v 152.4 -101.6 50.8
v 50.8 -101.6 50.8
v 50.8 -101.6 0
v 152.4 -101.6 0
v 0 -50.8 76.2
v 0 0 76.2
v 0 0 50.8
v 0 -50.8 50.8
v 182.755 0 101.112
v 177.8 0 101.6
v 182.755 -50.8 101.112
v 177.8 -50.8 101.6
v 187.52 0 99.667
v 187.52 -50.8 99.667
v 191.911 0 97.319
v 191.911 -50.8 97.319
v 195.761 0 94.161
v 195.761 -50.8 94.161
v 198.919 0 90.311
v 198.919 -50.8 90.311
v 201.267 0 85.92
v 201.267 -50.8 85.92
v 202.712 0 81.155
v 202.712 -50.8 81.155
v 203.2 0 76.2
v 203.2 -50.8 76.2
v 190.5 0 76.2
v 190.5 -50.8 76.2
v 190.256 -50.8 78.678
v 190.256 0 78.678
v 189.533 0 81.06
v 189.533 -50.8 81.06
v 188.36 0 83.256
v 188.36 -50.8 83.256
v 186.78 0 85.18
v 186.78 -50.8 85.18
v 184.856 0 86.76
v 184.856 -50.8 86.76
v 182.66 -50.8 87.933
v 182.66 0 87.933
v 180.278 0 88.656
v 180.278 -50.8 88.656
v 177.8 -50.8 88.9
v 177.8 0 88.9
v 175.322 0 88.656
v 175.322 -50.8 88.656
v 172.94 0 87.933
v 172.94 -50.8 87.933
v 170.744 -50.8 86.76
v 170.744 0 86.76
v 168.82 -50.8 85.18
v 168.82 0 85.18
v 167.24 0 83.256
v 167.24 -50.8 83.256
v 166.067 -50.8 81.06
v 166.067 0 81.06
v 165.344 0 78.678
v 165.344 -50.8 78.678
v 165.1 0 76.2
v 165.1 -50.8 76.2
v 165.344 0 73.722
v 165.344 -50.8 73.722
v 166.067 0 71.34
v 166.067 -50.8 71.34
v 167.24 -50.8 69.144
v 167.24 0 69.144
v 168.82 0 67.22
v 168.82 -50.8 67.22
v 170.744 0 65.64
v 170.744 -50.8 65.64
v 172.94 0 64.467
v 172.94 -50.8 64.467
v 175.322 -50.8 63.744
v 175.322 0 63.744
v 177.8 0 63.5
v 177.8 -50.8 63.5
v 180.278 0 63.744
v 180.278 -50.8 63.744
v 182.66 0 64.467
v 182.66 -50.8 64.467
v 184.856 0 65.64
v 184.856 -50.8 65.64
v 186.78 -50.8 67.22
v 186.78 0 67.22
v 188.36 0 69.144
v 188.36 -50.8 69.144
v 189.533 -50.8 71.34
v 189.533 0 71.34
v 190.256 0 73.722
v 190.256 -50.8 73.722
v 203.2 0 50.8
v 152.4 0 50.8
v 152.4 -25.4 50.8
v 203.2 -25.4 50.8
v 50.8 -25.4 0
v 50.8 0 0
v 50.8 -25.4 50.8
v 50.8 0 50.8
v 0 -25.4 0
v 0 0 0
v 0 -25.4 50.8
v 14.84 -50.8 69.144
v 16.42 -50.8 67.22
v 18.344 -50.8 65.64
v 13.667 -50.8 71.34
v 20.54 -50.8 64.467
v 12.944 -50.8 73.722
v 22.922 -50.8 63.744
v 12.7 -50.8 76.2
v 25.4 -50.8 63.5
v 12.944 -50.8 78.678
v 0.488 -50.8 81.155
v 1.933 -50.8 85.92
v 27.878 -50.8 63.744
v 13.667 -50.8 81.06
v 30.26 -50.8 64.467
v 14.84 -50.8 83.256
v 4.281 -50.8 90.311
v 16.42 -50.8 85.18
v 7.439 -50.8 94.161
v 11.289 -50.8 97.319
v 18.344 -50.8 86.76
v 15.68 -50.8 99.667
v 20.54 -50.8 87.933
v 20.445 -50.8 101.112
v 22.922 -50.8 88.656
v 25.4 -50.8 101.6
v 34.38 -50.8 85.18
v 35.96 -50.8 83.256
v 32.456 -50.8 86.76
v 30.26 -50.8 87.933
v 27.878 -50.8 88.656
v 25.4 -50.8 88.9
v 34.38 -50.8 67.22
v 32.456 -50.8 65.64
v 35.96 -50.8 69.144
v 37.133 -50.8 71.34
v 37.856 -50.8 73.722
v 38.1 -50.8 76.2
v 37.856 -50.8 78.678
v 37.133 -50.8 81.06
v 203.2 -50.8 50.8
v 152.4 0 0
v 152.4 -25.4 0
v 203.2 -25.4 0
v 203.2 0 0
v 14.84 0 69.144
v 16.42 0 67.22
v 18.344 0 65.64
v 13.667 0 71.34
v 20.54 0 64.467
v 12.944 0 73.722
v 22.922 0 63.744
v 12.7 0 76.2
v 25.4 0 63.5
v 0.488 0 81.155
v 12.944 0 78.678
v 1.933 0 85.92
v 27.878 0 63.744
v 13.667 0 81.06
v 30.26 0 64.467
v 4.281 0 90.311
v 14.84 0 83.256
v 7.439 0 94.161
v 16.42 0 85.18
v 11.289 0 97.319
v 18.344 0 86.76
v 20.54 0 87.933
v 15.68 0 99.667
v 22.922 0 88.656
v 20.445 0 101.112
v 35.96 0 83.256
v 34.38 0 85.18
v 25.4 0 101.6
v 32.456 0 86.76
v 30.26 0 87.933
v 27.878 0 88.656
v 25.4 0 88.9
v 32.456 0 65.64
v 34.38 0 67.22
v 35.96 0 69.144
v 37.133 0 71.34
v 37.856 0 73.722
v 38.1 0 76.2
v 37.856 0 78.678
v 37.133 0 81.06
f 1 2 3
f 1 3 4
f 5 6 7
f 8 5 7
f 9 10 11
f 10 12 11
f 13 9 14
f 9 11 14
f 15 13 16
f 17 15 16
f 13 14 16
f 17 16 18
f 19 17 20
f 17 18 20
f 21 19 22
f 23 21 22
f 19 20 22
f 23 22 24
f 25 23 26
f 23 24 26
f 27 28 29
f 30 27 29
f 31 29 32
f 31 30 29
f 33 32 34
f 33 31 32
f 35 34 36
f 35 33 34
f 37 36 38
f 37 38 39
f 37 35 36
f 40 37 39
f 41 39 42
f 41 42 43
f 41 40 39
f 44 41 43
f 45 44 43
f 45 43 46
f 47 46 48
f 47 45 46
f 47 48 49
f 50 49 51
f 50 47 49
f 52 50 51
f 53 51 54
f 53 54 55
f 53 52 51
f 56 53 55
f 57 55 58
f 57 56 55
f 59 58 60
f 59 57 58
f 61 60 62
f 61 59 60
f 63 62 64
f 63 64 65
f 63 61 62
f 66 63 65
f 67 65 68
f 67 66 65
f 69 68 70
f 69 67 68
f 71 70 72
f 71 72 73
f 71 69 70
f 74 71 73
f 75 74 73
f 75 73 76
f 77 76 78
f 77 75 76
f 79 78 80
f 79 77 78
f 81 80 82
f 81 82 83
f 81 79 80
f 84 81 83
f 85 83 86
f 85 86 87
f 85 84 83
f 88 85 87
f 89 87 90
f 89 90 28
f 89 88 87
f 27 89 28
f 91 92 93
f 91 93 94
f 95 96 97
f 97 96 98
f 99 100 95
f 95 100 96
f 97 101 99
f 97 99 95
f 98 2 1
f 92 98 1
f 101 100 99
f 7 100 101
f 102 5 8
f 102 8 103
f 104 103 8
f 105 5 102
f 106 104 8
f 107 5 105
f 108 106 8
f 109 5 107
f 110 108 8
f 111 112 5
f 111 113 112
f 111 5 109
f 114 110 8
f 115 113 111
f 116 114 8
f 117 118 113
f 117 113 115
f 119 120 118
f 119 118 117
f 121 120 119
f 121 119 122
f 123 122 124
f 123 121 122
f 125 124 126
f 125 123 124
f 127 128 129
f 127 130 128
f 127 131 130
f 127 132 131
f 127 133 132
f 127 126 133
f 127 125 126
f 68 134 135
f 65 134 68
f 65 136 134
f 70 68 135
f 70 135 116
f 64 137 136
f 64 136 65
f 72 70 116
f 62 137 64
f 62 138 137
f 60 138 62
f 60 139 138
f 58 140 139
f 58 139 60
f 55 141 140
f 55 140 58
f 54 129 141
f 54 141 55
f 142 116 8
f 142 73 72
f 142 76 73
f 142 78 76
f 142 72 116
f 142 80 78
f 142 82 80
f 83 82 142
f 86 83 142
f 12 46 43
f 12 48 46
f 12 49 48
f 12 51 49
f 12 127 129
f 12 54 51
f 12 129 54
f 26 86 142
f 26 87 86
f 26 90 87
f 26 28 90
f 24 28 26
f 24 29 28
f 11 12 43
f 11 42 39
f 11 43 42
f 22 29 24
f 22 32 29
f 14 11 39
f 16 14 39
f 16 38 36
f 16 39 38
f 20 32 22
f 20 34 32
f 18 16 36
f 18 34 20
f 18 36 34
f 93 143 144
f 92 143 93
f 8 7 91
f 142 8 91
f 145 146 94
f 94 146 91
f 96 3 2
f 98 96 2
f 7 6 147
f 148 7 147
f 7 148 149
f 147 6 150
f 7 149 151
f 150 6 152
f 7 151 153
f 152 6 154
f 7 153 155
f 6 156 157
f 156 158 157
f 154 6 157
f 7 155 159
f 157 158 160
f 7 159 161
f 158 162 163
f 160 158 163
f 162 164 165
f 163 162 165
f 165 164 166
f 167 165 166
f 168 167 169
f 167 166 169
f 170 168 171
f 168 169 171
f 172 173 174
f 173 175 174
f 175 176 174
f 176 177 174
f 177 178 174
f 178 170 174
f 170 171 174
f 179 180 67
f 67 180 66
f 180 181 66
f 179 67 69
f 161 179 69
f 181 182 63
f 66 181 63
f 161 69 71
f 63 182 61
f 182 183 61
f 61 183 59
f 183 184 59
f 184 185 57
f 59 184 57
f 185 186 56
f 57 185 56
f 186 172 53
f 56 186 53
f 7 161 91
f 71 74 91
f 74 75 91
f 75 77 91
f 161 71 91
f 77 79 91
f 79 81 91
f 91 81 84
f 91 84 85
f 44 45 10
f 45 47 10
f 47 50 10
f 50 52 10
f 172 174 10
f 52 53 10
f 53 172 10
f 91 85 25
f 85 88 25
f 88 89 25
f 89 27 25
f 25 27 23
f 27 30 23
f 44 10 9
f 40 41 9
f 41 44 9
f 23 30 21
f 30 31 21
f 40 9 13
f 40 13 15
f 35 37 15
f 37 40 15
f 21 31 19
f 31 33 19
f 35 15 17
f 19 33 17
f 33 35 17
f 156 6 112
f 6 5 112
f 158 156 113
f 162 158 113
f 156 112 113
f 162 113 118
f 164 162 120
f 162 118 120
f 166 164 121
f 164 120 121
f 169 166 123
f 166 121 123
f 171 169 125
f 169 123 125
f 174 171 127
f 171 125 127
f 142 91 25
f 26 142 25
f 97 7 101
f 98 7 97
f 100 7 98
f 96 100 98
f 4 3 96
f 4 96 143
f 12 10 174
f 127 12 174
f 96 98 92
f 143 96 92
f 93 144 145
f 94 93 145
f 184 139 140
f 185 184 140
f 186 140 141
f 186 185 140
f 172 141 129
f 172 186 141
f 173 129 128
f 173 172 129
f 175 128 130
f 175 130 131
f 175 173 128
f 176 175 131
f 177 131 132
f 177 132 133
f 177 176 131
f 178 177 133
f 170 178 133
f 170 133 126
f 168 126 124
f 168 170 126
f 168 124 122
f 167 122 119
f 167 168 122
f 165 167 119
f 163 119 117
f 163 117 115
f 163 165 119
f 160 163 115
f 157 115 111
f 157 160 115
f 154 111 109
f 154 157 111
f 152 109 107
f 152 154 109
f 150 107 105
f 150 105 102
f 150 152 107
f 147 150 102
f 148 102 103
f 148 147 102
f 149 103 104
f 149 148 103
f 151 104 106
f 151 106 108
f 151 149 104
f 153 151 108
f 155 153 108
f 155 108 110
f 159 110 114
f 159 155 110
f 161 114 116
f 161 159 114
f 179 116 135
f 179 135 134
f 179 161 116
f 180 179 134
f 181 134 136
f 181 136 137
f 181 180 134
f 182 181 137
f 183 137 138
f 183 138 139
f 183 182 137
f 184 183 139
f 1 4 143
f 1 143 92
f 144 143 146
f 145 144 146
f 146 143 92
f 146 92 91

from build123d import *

# Parameters (mm, degrees)
F0_W     = 50.8
F0_H     = 50.8
F1_DEPTH = 25.4
F2_DEPTH = 25.4
F0_W_2   = 101.6
F3_DEPTH = 101.6
F0_R     = 12.7
F4_DEPTH = 50.8
F5_R     = 25.4
F6_R     = 25.4
F7_DEPTH = 25.4


with BuildPart() as f1:
    # F0 (on Front) → F1 (new body)
    with BuildSketch(Plane.XZ):
        with Locations((25.4, 25.4)):
            Rectangle(F0_W, F0_H)
    extrude(amount=F1_DEPTH)

    # F0 (on Front) → F7 (cut)
    with BuildSketch(Plane.XZ):
        with Locations((177.8, 76.2)):
            Circle(F0_R)
        with Locations((25.4, 76.2)):
            Circle(F0_R)
    extrude(amount=-F7_DEPTH, mode=Mode.SUBTRACT)


with BuildPart() as f2:
    # F0 (on Front) → F2 (new body)
    with BuildSketch(Plane.XZ):
        with Locations((177.8, 25.4)):
            Rectangle(F0_W, F0_H)
    extrude(amount=F2_DEPTH)


with BuildPart() as f3:
    # F0 (on Front) → F3 (new body)
    with BuildSketch(Plane.XZ):
        with Locations((101.6, 25.4)):
            Rectangle(F0_W_2, F0_H)
    extrude(amount=F3_DEPTH)


with BuildPart() as f4:
    # F0 (on Front) → F4 (new body)
    with BuildSketch(Plane.XZ):
        Polygon((0, 101.6), (0, 50.8), (50.8, 50.8), (152.4, 50.8), (203.2, 50.8), (203.2, 76.2), (203.2, 101.6), align=None)
        with Locations((25.4, 76.2)):
            Circle(F0_R, mode=Mode.SUBTRACT)
        with Locations((177.8, 76.2)):
            Circle(F0_R, mode=Mode.SUBTRACT)
    extrude(amount=F4_DEPTH)

    # F5
    f5_edges = [f4.edges().sort_by_distance(p)[0] for p in [
        (0, -25.4, 101.6),
    ]]
    fillet(f5_edges, radius=F5_R)

    # F6
    f6_edges = [f4.edges().sort_by_distance(p)[0] for p in [
        (203.2, -25.4, 101.6),
    ]]
    fillet(f6_edges, radius=F6_R)


solid = Compound([f1.part, f2.part, f3.part, f4.part])
